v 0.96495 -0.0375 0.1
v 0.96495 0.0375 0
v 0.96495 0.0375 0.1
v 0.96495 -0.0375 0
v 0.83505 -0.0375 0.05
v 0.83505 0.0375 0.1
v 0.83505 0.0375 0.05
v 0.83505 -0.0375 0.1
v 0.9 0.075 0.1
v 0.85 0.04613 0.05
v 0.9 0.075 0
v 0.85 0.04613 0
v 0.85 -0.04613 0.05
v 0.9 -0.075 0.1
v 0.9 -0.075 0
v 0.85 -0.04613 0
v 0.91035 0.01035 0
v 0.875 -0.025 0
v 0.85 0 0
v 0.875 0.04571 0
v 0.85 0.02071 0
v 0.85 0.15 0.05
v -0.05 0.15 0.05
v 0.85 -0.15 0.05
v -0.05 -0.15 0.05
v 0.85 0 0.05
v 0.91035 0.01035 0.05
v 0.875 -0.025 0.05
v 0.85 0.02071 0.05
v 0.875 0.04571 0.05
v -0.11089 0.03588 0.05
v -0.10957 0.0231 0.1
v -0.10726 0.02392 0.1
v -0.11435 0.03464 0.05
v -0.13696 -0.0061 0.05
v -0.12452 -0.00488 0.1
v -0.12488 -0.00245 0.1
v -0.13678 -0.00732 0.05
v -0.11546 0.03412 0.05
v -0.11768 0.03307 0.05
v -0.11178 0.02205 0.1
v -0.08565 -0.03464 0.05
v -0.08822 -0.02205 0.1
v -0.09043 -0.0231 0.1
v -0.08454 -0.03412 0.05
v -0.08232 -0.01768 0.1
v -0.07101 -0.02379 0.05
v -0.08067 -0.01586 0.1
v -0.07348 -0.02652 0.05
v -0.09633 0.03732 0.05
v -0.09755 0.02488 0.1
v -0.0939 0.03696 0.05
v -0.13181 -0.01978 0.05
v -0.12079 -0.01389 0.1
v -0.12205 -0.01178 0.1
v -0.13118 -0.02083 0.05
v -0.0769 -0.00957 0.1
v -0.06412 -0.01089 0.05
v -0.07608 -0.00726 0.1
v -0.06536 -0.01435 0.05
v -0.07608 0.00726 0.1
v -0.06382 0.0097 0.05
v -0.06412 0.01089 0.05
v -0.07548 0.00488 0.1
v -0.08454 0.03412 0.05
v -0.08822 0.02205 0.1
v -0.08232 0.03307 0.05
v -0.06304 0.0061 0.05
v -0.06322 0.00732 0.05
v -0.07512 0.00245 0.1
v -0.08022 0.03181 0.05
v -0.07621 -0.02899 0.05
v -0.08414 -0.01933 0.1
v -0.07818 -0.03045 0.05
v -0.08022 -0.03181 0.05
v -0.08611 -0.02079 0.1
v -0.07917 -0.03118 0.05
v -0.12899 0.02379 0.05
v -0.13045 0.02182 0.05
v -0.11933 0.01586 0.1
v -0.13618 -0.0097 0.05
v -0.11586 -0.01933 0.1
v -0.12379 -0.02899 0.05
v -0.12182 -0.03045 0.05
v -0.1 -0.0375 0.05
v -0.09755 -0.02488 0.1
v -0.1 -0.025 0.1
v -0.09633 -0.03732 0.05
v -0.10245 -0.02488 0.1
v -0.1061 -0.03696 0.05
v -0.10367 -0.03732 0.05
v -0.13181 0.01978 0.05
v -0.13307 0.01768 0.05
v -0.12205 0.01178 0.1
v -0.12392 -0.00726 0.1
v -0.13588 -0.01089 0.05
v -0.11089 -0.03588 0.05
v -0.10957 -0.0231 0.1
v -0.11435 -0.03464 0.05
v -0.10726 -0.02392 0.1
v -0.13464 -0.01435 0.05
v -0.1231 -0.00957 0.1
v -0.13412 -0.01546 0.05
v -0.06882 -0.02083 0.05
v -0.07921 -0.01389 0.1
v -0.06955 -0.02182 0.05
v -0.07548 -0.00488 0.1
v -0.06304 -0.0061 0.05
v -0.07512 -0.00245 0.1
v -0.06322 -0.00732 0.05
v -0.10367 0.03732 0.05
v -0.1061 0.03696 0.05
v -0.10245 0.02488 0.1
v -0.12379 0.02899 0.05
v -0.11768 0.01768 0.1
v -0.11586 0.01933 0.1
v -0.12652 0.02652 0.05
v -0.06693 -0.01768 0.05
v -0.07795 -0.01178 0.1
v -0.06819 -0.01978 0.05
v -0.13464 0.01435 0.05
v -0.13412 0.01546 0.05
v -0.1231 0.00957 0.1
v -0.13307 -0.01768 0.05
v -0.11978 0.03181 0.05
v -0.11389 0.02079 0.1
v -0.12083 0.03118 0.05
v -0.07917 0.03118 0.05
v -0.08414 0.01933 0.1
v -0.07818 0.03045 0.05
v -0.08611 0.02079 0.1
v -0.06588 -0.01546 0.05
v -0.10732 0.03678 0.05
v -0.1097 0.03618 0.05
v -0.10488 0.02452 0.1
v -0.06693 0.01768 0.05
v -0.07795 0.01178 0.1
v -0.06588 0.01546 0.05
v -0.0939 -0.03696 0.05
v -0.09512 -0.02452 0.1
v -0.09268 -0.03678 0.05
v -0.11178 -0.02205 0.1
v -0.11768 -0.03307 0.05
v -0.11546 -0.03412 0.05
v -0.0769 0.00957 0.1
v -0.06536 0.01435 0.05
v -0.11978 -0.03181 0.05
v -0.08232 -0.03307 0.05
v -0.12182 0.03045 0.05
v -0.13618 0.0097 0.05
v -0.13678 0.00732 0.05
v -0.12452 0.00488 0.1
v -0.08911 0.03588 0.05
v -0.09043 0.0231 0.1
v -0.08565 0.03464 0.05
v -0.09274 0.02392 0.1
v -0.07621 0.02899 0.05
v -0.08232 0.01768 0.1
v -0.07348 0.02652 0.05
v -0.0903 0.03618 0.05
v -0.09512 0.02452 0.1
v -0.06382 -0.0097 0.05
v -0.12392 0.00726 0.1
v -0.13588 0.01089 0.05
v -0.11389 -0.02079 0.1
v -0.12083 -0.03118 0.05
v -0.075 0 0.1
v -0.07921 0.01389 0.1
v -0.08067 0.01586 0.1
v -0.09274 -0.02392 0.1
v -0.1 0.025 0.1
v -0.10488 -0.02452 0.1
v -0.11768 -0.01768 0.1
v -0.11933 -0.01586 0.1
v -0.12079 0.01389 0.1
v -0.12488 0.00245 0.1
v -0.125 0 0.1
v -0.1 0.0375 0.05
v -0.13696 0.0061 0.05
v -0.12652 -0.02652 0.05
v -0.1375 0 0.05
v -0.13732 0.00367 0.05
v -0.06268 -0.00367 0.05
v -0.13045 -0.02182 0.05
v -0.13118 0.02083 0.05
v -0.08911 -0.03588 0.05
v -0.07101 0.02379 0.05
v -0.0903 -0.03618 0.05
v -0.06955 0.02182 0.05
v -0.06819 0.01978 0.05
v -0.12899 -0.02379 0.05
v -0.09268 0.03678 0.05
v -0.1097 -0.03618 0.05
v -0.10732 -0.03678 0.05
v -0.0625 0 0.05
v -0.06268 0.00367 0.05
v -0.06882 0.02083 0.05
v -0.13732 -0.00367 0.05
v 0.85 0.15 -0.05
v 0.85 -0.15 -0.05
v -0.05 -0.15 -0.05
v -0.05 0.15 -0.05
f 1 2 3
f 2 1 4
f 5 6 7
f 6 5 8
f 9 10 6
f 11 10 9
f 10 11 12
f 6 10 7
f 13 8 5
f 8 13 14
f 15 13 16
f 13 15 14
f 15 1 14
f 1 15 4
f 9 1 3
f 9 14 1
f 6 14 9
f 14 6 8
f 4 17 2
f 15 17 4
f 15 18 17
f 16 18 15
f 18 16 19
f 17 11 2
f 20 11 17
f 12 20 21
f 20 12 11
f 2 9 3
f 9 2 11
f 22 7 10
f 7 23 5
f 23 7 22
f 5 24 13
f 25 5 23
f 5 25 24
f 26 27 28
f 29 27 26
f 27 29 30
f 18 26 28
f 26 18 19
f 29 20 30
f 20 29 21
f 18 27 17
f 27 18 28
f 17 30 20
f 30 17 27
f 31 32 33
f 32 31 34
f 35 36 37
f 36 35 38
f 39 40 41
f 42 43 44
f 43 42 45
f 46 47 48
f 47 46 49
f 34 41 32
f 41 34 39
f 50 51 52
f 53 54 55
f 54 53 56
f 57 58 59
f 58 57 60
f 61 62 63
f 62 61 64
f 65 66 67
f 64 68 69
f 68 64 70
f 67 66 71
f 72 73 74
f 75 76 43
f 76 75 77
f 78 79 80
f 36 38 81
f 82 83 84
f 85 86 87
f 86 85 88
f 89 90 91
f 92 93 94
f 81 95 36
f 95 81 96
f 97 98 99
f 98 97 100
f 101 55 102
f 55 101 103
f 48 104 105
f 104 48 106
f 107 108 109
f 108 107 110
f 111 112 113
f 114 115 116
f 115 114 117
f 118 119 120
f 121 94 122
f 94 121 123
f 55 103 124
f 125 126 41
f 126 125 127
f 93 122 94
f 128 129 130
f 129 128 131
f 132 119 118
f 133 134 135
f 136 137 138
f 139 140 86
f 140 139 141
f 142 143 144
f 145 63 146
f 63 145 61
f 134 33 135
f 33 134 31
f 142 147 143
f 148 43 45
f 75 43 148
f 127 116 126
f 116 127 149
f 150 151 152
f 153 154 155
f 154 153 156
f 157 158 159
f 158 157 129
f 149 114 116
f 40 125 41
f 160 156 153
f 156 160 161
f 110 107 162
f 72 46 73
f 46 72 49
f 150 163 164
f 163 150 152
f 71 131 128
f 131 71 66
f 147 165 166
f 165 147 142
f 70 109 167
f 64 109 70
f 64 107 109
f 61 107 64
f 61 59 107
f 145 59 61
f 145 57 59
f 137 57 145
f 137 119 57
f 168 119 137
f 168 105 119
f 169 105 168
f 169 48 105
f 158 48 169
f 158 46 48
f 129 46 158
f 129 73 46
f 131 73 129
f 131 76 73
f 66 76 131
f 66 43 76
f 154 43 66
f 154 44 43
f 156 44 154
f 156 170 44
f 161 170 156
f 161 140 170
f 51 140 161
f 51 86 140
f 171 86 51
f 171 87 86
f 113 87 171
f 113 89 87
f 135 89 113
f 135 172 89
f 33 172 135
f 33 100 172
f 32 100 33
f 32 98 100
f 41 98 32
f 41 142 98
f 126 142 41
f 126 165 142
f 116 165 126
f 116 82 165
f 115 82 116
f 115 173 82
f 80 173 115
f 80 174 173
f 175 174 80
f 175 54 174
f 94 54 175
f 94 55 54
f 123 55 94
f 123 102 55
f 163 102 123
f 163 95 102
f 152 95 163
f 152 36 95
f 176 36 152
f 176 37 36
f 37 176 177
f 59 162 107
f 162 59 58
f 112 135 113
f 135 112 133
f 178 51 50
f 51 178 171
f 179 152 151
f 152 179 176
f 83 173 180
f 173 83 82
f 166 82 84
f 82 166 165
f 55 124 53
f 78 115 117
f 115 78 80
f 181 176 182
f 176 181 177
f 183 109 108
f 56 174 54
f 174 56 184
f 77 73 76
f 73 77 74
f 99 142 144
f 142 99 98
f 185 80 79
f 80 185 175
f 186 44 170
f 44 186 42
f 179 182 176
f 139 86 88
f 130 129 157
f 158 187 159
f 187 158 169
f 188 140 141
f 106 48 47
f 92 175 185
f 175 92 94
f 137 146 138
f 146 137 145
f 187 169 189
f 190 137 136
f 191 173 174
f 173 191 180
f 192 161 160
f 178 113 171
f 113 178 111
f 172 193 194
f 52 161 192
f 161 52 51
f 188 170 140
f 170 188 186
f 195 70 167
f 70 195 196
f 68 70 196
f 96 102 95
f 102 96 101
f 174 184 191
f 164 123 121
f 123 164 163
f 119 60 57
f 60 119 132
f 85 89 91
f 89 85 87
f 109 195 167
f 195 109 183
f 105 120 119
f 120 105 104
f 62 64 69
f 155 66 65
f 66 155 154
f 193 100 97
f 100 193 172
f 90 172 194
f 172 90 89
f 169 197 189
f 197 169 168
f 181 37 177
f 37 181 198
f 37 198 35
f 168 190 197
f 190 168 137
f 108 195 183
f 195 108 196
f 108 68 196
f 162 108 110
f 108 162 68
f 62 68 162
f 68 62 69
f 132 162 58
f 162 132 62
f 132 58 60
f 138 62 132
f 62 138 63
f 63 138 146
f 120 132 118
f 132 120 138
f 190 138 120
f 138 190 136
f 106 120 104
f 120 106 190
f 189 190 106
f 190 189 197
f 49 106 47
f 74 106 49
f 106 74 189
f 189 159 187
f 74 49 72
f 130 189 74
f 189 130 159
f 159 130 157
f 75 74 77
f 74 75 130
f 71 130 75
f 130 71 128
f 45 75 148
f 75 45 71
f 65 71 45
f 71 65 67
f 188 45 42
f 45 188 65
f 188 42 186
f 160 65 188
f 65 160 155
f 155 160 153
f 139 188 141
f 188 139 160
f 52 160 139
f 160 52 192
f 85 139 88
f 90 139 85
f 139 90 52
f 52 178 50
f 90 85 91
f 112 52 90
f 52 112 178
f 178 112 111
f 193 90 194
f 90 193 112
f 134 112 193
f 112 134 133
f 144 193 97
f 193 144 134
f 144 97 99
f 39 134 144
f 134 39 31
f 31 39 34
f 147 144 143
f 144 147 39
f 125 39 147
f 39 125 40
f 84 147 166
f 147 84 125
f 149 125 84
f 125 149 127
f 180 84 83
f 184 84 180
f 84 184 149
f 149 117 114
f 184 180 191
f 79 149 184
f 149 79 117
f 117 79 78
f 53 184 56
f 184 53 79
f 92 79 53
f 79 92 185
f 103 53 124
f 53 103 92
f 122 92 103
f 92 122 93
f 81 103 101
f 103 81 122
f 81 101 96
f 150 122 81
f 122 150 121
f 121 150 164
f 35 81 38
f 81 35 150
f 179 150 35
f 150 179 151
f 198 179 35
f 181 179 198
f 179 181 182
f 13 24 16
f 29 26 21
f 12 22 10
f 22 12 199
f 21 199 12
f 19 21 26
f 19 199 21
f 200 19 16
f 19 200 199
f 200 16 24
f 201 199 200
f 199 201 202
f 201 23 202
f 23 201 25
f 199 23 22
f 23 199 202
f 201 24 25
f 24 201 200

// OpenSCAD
module prismatic_bar() {
    // Main rectangular shaft
    translate([-0.05, -0.15, -0.05])
    cube([0.9, 0.3, 0.1]);

    // Hexagonal collar with recessed square opening
    translate([0.9, 0, 0])
    difference() {
        rotate([0, 0, 90])
        cylinder(h=0.1, r=0.075, $fn=6);
        translate([-0.025, -0.025, -0.05])
        rotate([0, 0, 45])
        cube([0.05, 0.05, 0.1]);
    }

    // Tapered/chamfered tip
    translate([-0.1, 0, 0])
    difference() {
        rotate([0, 0, 90])
        cylinder(h=0.1, r1=0.05, r2=0.025, $fn=64);
        translate([-0.05, -0.05, -0.05])
        cube([0.1, 0.1, 0.1]);
    }
}

prismatic_bar();
